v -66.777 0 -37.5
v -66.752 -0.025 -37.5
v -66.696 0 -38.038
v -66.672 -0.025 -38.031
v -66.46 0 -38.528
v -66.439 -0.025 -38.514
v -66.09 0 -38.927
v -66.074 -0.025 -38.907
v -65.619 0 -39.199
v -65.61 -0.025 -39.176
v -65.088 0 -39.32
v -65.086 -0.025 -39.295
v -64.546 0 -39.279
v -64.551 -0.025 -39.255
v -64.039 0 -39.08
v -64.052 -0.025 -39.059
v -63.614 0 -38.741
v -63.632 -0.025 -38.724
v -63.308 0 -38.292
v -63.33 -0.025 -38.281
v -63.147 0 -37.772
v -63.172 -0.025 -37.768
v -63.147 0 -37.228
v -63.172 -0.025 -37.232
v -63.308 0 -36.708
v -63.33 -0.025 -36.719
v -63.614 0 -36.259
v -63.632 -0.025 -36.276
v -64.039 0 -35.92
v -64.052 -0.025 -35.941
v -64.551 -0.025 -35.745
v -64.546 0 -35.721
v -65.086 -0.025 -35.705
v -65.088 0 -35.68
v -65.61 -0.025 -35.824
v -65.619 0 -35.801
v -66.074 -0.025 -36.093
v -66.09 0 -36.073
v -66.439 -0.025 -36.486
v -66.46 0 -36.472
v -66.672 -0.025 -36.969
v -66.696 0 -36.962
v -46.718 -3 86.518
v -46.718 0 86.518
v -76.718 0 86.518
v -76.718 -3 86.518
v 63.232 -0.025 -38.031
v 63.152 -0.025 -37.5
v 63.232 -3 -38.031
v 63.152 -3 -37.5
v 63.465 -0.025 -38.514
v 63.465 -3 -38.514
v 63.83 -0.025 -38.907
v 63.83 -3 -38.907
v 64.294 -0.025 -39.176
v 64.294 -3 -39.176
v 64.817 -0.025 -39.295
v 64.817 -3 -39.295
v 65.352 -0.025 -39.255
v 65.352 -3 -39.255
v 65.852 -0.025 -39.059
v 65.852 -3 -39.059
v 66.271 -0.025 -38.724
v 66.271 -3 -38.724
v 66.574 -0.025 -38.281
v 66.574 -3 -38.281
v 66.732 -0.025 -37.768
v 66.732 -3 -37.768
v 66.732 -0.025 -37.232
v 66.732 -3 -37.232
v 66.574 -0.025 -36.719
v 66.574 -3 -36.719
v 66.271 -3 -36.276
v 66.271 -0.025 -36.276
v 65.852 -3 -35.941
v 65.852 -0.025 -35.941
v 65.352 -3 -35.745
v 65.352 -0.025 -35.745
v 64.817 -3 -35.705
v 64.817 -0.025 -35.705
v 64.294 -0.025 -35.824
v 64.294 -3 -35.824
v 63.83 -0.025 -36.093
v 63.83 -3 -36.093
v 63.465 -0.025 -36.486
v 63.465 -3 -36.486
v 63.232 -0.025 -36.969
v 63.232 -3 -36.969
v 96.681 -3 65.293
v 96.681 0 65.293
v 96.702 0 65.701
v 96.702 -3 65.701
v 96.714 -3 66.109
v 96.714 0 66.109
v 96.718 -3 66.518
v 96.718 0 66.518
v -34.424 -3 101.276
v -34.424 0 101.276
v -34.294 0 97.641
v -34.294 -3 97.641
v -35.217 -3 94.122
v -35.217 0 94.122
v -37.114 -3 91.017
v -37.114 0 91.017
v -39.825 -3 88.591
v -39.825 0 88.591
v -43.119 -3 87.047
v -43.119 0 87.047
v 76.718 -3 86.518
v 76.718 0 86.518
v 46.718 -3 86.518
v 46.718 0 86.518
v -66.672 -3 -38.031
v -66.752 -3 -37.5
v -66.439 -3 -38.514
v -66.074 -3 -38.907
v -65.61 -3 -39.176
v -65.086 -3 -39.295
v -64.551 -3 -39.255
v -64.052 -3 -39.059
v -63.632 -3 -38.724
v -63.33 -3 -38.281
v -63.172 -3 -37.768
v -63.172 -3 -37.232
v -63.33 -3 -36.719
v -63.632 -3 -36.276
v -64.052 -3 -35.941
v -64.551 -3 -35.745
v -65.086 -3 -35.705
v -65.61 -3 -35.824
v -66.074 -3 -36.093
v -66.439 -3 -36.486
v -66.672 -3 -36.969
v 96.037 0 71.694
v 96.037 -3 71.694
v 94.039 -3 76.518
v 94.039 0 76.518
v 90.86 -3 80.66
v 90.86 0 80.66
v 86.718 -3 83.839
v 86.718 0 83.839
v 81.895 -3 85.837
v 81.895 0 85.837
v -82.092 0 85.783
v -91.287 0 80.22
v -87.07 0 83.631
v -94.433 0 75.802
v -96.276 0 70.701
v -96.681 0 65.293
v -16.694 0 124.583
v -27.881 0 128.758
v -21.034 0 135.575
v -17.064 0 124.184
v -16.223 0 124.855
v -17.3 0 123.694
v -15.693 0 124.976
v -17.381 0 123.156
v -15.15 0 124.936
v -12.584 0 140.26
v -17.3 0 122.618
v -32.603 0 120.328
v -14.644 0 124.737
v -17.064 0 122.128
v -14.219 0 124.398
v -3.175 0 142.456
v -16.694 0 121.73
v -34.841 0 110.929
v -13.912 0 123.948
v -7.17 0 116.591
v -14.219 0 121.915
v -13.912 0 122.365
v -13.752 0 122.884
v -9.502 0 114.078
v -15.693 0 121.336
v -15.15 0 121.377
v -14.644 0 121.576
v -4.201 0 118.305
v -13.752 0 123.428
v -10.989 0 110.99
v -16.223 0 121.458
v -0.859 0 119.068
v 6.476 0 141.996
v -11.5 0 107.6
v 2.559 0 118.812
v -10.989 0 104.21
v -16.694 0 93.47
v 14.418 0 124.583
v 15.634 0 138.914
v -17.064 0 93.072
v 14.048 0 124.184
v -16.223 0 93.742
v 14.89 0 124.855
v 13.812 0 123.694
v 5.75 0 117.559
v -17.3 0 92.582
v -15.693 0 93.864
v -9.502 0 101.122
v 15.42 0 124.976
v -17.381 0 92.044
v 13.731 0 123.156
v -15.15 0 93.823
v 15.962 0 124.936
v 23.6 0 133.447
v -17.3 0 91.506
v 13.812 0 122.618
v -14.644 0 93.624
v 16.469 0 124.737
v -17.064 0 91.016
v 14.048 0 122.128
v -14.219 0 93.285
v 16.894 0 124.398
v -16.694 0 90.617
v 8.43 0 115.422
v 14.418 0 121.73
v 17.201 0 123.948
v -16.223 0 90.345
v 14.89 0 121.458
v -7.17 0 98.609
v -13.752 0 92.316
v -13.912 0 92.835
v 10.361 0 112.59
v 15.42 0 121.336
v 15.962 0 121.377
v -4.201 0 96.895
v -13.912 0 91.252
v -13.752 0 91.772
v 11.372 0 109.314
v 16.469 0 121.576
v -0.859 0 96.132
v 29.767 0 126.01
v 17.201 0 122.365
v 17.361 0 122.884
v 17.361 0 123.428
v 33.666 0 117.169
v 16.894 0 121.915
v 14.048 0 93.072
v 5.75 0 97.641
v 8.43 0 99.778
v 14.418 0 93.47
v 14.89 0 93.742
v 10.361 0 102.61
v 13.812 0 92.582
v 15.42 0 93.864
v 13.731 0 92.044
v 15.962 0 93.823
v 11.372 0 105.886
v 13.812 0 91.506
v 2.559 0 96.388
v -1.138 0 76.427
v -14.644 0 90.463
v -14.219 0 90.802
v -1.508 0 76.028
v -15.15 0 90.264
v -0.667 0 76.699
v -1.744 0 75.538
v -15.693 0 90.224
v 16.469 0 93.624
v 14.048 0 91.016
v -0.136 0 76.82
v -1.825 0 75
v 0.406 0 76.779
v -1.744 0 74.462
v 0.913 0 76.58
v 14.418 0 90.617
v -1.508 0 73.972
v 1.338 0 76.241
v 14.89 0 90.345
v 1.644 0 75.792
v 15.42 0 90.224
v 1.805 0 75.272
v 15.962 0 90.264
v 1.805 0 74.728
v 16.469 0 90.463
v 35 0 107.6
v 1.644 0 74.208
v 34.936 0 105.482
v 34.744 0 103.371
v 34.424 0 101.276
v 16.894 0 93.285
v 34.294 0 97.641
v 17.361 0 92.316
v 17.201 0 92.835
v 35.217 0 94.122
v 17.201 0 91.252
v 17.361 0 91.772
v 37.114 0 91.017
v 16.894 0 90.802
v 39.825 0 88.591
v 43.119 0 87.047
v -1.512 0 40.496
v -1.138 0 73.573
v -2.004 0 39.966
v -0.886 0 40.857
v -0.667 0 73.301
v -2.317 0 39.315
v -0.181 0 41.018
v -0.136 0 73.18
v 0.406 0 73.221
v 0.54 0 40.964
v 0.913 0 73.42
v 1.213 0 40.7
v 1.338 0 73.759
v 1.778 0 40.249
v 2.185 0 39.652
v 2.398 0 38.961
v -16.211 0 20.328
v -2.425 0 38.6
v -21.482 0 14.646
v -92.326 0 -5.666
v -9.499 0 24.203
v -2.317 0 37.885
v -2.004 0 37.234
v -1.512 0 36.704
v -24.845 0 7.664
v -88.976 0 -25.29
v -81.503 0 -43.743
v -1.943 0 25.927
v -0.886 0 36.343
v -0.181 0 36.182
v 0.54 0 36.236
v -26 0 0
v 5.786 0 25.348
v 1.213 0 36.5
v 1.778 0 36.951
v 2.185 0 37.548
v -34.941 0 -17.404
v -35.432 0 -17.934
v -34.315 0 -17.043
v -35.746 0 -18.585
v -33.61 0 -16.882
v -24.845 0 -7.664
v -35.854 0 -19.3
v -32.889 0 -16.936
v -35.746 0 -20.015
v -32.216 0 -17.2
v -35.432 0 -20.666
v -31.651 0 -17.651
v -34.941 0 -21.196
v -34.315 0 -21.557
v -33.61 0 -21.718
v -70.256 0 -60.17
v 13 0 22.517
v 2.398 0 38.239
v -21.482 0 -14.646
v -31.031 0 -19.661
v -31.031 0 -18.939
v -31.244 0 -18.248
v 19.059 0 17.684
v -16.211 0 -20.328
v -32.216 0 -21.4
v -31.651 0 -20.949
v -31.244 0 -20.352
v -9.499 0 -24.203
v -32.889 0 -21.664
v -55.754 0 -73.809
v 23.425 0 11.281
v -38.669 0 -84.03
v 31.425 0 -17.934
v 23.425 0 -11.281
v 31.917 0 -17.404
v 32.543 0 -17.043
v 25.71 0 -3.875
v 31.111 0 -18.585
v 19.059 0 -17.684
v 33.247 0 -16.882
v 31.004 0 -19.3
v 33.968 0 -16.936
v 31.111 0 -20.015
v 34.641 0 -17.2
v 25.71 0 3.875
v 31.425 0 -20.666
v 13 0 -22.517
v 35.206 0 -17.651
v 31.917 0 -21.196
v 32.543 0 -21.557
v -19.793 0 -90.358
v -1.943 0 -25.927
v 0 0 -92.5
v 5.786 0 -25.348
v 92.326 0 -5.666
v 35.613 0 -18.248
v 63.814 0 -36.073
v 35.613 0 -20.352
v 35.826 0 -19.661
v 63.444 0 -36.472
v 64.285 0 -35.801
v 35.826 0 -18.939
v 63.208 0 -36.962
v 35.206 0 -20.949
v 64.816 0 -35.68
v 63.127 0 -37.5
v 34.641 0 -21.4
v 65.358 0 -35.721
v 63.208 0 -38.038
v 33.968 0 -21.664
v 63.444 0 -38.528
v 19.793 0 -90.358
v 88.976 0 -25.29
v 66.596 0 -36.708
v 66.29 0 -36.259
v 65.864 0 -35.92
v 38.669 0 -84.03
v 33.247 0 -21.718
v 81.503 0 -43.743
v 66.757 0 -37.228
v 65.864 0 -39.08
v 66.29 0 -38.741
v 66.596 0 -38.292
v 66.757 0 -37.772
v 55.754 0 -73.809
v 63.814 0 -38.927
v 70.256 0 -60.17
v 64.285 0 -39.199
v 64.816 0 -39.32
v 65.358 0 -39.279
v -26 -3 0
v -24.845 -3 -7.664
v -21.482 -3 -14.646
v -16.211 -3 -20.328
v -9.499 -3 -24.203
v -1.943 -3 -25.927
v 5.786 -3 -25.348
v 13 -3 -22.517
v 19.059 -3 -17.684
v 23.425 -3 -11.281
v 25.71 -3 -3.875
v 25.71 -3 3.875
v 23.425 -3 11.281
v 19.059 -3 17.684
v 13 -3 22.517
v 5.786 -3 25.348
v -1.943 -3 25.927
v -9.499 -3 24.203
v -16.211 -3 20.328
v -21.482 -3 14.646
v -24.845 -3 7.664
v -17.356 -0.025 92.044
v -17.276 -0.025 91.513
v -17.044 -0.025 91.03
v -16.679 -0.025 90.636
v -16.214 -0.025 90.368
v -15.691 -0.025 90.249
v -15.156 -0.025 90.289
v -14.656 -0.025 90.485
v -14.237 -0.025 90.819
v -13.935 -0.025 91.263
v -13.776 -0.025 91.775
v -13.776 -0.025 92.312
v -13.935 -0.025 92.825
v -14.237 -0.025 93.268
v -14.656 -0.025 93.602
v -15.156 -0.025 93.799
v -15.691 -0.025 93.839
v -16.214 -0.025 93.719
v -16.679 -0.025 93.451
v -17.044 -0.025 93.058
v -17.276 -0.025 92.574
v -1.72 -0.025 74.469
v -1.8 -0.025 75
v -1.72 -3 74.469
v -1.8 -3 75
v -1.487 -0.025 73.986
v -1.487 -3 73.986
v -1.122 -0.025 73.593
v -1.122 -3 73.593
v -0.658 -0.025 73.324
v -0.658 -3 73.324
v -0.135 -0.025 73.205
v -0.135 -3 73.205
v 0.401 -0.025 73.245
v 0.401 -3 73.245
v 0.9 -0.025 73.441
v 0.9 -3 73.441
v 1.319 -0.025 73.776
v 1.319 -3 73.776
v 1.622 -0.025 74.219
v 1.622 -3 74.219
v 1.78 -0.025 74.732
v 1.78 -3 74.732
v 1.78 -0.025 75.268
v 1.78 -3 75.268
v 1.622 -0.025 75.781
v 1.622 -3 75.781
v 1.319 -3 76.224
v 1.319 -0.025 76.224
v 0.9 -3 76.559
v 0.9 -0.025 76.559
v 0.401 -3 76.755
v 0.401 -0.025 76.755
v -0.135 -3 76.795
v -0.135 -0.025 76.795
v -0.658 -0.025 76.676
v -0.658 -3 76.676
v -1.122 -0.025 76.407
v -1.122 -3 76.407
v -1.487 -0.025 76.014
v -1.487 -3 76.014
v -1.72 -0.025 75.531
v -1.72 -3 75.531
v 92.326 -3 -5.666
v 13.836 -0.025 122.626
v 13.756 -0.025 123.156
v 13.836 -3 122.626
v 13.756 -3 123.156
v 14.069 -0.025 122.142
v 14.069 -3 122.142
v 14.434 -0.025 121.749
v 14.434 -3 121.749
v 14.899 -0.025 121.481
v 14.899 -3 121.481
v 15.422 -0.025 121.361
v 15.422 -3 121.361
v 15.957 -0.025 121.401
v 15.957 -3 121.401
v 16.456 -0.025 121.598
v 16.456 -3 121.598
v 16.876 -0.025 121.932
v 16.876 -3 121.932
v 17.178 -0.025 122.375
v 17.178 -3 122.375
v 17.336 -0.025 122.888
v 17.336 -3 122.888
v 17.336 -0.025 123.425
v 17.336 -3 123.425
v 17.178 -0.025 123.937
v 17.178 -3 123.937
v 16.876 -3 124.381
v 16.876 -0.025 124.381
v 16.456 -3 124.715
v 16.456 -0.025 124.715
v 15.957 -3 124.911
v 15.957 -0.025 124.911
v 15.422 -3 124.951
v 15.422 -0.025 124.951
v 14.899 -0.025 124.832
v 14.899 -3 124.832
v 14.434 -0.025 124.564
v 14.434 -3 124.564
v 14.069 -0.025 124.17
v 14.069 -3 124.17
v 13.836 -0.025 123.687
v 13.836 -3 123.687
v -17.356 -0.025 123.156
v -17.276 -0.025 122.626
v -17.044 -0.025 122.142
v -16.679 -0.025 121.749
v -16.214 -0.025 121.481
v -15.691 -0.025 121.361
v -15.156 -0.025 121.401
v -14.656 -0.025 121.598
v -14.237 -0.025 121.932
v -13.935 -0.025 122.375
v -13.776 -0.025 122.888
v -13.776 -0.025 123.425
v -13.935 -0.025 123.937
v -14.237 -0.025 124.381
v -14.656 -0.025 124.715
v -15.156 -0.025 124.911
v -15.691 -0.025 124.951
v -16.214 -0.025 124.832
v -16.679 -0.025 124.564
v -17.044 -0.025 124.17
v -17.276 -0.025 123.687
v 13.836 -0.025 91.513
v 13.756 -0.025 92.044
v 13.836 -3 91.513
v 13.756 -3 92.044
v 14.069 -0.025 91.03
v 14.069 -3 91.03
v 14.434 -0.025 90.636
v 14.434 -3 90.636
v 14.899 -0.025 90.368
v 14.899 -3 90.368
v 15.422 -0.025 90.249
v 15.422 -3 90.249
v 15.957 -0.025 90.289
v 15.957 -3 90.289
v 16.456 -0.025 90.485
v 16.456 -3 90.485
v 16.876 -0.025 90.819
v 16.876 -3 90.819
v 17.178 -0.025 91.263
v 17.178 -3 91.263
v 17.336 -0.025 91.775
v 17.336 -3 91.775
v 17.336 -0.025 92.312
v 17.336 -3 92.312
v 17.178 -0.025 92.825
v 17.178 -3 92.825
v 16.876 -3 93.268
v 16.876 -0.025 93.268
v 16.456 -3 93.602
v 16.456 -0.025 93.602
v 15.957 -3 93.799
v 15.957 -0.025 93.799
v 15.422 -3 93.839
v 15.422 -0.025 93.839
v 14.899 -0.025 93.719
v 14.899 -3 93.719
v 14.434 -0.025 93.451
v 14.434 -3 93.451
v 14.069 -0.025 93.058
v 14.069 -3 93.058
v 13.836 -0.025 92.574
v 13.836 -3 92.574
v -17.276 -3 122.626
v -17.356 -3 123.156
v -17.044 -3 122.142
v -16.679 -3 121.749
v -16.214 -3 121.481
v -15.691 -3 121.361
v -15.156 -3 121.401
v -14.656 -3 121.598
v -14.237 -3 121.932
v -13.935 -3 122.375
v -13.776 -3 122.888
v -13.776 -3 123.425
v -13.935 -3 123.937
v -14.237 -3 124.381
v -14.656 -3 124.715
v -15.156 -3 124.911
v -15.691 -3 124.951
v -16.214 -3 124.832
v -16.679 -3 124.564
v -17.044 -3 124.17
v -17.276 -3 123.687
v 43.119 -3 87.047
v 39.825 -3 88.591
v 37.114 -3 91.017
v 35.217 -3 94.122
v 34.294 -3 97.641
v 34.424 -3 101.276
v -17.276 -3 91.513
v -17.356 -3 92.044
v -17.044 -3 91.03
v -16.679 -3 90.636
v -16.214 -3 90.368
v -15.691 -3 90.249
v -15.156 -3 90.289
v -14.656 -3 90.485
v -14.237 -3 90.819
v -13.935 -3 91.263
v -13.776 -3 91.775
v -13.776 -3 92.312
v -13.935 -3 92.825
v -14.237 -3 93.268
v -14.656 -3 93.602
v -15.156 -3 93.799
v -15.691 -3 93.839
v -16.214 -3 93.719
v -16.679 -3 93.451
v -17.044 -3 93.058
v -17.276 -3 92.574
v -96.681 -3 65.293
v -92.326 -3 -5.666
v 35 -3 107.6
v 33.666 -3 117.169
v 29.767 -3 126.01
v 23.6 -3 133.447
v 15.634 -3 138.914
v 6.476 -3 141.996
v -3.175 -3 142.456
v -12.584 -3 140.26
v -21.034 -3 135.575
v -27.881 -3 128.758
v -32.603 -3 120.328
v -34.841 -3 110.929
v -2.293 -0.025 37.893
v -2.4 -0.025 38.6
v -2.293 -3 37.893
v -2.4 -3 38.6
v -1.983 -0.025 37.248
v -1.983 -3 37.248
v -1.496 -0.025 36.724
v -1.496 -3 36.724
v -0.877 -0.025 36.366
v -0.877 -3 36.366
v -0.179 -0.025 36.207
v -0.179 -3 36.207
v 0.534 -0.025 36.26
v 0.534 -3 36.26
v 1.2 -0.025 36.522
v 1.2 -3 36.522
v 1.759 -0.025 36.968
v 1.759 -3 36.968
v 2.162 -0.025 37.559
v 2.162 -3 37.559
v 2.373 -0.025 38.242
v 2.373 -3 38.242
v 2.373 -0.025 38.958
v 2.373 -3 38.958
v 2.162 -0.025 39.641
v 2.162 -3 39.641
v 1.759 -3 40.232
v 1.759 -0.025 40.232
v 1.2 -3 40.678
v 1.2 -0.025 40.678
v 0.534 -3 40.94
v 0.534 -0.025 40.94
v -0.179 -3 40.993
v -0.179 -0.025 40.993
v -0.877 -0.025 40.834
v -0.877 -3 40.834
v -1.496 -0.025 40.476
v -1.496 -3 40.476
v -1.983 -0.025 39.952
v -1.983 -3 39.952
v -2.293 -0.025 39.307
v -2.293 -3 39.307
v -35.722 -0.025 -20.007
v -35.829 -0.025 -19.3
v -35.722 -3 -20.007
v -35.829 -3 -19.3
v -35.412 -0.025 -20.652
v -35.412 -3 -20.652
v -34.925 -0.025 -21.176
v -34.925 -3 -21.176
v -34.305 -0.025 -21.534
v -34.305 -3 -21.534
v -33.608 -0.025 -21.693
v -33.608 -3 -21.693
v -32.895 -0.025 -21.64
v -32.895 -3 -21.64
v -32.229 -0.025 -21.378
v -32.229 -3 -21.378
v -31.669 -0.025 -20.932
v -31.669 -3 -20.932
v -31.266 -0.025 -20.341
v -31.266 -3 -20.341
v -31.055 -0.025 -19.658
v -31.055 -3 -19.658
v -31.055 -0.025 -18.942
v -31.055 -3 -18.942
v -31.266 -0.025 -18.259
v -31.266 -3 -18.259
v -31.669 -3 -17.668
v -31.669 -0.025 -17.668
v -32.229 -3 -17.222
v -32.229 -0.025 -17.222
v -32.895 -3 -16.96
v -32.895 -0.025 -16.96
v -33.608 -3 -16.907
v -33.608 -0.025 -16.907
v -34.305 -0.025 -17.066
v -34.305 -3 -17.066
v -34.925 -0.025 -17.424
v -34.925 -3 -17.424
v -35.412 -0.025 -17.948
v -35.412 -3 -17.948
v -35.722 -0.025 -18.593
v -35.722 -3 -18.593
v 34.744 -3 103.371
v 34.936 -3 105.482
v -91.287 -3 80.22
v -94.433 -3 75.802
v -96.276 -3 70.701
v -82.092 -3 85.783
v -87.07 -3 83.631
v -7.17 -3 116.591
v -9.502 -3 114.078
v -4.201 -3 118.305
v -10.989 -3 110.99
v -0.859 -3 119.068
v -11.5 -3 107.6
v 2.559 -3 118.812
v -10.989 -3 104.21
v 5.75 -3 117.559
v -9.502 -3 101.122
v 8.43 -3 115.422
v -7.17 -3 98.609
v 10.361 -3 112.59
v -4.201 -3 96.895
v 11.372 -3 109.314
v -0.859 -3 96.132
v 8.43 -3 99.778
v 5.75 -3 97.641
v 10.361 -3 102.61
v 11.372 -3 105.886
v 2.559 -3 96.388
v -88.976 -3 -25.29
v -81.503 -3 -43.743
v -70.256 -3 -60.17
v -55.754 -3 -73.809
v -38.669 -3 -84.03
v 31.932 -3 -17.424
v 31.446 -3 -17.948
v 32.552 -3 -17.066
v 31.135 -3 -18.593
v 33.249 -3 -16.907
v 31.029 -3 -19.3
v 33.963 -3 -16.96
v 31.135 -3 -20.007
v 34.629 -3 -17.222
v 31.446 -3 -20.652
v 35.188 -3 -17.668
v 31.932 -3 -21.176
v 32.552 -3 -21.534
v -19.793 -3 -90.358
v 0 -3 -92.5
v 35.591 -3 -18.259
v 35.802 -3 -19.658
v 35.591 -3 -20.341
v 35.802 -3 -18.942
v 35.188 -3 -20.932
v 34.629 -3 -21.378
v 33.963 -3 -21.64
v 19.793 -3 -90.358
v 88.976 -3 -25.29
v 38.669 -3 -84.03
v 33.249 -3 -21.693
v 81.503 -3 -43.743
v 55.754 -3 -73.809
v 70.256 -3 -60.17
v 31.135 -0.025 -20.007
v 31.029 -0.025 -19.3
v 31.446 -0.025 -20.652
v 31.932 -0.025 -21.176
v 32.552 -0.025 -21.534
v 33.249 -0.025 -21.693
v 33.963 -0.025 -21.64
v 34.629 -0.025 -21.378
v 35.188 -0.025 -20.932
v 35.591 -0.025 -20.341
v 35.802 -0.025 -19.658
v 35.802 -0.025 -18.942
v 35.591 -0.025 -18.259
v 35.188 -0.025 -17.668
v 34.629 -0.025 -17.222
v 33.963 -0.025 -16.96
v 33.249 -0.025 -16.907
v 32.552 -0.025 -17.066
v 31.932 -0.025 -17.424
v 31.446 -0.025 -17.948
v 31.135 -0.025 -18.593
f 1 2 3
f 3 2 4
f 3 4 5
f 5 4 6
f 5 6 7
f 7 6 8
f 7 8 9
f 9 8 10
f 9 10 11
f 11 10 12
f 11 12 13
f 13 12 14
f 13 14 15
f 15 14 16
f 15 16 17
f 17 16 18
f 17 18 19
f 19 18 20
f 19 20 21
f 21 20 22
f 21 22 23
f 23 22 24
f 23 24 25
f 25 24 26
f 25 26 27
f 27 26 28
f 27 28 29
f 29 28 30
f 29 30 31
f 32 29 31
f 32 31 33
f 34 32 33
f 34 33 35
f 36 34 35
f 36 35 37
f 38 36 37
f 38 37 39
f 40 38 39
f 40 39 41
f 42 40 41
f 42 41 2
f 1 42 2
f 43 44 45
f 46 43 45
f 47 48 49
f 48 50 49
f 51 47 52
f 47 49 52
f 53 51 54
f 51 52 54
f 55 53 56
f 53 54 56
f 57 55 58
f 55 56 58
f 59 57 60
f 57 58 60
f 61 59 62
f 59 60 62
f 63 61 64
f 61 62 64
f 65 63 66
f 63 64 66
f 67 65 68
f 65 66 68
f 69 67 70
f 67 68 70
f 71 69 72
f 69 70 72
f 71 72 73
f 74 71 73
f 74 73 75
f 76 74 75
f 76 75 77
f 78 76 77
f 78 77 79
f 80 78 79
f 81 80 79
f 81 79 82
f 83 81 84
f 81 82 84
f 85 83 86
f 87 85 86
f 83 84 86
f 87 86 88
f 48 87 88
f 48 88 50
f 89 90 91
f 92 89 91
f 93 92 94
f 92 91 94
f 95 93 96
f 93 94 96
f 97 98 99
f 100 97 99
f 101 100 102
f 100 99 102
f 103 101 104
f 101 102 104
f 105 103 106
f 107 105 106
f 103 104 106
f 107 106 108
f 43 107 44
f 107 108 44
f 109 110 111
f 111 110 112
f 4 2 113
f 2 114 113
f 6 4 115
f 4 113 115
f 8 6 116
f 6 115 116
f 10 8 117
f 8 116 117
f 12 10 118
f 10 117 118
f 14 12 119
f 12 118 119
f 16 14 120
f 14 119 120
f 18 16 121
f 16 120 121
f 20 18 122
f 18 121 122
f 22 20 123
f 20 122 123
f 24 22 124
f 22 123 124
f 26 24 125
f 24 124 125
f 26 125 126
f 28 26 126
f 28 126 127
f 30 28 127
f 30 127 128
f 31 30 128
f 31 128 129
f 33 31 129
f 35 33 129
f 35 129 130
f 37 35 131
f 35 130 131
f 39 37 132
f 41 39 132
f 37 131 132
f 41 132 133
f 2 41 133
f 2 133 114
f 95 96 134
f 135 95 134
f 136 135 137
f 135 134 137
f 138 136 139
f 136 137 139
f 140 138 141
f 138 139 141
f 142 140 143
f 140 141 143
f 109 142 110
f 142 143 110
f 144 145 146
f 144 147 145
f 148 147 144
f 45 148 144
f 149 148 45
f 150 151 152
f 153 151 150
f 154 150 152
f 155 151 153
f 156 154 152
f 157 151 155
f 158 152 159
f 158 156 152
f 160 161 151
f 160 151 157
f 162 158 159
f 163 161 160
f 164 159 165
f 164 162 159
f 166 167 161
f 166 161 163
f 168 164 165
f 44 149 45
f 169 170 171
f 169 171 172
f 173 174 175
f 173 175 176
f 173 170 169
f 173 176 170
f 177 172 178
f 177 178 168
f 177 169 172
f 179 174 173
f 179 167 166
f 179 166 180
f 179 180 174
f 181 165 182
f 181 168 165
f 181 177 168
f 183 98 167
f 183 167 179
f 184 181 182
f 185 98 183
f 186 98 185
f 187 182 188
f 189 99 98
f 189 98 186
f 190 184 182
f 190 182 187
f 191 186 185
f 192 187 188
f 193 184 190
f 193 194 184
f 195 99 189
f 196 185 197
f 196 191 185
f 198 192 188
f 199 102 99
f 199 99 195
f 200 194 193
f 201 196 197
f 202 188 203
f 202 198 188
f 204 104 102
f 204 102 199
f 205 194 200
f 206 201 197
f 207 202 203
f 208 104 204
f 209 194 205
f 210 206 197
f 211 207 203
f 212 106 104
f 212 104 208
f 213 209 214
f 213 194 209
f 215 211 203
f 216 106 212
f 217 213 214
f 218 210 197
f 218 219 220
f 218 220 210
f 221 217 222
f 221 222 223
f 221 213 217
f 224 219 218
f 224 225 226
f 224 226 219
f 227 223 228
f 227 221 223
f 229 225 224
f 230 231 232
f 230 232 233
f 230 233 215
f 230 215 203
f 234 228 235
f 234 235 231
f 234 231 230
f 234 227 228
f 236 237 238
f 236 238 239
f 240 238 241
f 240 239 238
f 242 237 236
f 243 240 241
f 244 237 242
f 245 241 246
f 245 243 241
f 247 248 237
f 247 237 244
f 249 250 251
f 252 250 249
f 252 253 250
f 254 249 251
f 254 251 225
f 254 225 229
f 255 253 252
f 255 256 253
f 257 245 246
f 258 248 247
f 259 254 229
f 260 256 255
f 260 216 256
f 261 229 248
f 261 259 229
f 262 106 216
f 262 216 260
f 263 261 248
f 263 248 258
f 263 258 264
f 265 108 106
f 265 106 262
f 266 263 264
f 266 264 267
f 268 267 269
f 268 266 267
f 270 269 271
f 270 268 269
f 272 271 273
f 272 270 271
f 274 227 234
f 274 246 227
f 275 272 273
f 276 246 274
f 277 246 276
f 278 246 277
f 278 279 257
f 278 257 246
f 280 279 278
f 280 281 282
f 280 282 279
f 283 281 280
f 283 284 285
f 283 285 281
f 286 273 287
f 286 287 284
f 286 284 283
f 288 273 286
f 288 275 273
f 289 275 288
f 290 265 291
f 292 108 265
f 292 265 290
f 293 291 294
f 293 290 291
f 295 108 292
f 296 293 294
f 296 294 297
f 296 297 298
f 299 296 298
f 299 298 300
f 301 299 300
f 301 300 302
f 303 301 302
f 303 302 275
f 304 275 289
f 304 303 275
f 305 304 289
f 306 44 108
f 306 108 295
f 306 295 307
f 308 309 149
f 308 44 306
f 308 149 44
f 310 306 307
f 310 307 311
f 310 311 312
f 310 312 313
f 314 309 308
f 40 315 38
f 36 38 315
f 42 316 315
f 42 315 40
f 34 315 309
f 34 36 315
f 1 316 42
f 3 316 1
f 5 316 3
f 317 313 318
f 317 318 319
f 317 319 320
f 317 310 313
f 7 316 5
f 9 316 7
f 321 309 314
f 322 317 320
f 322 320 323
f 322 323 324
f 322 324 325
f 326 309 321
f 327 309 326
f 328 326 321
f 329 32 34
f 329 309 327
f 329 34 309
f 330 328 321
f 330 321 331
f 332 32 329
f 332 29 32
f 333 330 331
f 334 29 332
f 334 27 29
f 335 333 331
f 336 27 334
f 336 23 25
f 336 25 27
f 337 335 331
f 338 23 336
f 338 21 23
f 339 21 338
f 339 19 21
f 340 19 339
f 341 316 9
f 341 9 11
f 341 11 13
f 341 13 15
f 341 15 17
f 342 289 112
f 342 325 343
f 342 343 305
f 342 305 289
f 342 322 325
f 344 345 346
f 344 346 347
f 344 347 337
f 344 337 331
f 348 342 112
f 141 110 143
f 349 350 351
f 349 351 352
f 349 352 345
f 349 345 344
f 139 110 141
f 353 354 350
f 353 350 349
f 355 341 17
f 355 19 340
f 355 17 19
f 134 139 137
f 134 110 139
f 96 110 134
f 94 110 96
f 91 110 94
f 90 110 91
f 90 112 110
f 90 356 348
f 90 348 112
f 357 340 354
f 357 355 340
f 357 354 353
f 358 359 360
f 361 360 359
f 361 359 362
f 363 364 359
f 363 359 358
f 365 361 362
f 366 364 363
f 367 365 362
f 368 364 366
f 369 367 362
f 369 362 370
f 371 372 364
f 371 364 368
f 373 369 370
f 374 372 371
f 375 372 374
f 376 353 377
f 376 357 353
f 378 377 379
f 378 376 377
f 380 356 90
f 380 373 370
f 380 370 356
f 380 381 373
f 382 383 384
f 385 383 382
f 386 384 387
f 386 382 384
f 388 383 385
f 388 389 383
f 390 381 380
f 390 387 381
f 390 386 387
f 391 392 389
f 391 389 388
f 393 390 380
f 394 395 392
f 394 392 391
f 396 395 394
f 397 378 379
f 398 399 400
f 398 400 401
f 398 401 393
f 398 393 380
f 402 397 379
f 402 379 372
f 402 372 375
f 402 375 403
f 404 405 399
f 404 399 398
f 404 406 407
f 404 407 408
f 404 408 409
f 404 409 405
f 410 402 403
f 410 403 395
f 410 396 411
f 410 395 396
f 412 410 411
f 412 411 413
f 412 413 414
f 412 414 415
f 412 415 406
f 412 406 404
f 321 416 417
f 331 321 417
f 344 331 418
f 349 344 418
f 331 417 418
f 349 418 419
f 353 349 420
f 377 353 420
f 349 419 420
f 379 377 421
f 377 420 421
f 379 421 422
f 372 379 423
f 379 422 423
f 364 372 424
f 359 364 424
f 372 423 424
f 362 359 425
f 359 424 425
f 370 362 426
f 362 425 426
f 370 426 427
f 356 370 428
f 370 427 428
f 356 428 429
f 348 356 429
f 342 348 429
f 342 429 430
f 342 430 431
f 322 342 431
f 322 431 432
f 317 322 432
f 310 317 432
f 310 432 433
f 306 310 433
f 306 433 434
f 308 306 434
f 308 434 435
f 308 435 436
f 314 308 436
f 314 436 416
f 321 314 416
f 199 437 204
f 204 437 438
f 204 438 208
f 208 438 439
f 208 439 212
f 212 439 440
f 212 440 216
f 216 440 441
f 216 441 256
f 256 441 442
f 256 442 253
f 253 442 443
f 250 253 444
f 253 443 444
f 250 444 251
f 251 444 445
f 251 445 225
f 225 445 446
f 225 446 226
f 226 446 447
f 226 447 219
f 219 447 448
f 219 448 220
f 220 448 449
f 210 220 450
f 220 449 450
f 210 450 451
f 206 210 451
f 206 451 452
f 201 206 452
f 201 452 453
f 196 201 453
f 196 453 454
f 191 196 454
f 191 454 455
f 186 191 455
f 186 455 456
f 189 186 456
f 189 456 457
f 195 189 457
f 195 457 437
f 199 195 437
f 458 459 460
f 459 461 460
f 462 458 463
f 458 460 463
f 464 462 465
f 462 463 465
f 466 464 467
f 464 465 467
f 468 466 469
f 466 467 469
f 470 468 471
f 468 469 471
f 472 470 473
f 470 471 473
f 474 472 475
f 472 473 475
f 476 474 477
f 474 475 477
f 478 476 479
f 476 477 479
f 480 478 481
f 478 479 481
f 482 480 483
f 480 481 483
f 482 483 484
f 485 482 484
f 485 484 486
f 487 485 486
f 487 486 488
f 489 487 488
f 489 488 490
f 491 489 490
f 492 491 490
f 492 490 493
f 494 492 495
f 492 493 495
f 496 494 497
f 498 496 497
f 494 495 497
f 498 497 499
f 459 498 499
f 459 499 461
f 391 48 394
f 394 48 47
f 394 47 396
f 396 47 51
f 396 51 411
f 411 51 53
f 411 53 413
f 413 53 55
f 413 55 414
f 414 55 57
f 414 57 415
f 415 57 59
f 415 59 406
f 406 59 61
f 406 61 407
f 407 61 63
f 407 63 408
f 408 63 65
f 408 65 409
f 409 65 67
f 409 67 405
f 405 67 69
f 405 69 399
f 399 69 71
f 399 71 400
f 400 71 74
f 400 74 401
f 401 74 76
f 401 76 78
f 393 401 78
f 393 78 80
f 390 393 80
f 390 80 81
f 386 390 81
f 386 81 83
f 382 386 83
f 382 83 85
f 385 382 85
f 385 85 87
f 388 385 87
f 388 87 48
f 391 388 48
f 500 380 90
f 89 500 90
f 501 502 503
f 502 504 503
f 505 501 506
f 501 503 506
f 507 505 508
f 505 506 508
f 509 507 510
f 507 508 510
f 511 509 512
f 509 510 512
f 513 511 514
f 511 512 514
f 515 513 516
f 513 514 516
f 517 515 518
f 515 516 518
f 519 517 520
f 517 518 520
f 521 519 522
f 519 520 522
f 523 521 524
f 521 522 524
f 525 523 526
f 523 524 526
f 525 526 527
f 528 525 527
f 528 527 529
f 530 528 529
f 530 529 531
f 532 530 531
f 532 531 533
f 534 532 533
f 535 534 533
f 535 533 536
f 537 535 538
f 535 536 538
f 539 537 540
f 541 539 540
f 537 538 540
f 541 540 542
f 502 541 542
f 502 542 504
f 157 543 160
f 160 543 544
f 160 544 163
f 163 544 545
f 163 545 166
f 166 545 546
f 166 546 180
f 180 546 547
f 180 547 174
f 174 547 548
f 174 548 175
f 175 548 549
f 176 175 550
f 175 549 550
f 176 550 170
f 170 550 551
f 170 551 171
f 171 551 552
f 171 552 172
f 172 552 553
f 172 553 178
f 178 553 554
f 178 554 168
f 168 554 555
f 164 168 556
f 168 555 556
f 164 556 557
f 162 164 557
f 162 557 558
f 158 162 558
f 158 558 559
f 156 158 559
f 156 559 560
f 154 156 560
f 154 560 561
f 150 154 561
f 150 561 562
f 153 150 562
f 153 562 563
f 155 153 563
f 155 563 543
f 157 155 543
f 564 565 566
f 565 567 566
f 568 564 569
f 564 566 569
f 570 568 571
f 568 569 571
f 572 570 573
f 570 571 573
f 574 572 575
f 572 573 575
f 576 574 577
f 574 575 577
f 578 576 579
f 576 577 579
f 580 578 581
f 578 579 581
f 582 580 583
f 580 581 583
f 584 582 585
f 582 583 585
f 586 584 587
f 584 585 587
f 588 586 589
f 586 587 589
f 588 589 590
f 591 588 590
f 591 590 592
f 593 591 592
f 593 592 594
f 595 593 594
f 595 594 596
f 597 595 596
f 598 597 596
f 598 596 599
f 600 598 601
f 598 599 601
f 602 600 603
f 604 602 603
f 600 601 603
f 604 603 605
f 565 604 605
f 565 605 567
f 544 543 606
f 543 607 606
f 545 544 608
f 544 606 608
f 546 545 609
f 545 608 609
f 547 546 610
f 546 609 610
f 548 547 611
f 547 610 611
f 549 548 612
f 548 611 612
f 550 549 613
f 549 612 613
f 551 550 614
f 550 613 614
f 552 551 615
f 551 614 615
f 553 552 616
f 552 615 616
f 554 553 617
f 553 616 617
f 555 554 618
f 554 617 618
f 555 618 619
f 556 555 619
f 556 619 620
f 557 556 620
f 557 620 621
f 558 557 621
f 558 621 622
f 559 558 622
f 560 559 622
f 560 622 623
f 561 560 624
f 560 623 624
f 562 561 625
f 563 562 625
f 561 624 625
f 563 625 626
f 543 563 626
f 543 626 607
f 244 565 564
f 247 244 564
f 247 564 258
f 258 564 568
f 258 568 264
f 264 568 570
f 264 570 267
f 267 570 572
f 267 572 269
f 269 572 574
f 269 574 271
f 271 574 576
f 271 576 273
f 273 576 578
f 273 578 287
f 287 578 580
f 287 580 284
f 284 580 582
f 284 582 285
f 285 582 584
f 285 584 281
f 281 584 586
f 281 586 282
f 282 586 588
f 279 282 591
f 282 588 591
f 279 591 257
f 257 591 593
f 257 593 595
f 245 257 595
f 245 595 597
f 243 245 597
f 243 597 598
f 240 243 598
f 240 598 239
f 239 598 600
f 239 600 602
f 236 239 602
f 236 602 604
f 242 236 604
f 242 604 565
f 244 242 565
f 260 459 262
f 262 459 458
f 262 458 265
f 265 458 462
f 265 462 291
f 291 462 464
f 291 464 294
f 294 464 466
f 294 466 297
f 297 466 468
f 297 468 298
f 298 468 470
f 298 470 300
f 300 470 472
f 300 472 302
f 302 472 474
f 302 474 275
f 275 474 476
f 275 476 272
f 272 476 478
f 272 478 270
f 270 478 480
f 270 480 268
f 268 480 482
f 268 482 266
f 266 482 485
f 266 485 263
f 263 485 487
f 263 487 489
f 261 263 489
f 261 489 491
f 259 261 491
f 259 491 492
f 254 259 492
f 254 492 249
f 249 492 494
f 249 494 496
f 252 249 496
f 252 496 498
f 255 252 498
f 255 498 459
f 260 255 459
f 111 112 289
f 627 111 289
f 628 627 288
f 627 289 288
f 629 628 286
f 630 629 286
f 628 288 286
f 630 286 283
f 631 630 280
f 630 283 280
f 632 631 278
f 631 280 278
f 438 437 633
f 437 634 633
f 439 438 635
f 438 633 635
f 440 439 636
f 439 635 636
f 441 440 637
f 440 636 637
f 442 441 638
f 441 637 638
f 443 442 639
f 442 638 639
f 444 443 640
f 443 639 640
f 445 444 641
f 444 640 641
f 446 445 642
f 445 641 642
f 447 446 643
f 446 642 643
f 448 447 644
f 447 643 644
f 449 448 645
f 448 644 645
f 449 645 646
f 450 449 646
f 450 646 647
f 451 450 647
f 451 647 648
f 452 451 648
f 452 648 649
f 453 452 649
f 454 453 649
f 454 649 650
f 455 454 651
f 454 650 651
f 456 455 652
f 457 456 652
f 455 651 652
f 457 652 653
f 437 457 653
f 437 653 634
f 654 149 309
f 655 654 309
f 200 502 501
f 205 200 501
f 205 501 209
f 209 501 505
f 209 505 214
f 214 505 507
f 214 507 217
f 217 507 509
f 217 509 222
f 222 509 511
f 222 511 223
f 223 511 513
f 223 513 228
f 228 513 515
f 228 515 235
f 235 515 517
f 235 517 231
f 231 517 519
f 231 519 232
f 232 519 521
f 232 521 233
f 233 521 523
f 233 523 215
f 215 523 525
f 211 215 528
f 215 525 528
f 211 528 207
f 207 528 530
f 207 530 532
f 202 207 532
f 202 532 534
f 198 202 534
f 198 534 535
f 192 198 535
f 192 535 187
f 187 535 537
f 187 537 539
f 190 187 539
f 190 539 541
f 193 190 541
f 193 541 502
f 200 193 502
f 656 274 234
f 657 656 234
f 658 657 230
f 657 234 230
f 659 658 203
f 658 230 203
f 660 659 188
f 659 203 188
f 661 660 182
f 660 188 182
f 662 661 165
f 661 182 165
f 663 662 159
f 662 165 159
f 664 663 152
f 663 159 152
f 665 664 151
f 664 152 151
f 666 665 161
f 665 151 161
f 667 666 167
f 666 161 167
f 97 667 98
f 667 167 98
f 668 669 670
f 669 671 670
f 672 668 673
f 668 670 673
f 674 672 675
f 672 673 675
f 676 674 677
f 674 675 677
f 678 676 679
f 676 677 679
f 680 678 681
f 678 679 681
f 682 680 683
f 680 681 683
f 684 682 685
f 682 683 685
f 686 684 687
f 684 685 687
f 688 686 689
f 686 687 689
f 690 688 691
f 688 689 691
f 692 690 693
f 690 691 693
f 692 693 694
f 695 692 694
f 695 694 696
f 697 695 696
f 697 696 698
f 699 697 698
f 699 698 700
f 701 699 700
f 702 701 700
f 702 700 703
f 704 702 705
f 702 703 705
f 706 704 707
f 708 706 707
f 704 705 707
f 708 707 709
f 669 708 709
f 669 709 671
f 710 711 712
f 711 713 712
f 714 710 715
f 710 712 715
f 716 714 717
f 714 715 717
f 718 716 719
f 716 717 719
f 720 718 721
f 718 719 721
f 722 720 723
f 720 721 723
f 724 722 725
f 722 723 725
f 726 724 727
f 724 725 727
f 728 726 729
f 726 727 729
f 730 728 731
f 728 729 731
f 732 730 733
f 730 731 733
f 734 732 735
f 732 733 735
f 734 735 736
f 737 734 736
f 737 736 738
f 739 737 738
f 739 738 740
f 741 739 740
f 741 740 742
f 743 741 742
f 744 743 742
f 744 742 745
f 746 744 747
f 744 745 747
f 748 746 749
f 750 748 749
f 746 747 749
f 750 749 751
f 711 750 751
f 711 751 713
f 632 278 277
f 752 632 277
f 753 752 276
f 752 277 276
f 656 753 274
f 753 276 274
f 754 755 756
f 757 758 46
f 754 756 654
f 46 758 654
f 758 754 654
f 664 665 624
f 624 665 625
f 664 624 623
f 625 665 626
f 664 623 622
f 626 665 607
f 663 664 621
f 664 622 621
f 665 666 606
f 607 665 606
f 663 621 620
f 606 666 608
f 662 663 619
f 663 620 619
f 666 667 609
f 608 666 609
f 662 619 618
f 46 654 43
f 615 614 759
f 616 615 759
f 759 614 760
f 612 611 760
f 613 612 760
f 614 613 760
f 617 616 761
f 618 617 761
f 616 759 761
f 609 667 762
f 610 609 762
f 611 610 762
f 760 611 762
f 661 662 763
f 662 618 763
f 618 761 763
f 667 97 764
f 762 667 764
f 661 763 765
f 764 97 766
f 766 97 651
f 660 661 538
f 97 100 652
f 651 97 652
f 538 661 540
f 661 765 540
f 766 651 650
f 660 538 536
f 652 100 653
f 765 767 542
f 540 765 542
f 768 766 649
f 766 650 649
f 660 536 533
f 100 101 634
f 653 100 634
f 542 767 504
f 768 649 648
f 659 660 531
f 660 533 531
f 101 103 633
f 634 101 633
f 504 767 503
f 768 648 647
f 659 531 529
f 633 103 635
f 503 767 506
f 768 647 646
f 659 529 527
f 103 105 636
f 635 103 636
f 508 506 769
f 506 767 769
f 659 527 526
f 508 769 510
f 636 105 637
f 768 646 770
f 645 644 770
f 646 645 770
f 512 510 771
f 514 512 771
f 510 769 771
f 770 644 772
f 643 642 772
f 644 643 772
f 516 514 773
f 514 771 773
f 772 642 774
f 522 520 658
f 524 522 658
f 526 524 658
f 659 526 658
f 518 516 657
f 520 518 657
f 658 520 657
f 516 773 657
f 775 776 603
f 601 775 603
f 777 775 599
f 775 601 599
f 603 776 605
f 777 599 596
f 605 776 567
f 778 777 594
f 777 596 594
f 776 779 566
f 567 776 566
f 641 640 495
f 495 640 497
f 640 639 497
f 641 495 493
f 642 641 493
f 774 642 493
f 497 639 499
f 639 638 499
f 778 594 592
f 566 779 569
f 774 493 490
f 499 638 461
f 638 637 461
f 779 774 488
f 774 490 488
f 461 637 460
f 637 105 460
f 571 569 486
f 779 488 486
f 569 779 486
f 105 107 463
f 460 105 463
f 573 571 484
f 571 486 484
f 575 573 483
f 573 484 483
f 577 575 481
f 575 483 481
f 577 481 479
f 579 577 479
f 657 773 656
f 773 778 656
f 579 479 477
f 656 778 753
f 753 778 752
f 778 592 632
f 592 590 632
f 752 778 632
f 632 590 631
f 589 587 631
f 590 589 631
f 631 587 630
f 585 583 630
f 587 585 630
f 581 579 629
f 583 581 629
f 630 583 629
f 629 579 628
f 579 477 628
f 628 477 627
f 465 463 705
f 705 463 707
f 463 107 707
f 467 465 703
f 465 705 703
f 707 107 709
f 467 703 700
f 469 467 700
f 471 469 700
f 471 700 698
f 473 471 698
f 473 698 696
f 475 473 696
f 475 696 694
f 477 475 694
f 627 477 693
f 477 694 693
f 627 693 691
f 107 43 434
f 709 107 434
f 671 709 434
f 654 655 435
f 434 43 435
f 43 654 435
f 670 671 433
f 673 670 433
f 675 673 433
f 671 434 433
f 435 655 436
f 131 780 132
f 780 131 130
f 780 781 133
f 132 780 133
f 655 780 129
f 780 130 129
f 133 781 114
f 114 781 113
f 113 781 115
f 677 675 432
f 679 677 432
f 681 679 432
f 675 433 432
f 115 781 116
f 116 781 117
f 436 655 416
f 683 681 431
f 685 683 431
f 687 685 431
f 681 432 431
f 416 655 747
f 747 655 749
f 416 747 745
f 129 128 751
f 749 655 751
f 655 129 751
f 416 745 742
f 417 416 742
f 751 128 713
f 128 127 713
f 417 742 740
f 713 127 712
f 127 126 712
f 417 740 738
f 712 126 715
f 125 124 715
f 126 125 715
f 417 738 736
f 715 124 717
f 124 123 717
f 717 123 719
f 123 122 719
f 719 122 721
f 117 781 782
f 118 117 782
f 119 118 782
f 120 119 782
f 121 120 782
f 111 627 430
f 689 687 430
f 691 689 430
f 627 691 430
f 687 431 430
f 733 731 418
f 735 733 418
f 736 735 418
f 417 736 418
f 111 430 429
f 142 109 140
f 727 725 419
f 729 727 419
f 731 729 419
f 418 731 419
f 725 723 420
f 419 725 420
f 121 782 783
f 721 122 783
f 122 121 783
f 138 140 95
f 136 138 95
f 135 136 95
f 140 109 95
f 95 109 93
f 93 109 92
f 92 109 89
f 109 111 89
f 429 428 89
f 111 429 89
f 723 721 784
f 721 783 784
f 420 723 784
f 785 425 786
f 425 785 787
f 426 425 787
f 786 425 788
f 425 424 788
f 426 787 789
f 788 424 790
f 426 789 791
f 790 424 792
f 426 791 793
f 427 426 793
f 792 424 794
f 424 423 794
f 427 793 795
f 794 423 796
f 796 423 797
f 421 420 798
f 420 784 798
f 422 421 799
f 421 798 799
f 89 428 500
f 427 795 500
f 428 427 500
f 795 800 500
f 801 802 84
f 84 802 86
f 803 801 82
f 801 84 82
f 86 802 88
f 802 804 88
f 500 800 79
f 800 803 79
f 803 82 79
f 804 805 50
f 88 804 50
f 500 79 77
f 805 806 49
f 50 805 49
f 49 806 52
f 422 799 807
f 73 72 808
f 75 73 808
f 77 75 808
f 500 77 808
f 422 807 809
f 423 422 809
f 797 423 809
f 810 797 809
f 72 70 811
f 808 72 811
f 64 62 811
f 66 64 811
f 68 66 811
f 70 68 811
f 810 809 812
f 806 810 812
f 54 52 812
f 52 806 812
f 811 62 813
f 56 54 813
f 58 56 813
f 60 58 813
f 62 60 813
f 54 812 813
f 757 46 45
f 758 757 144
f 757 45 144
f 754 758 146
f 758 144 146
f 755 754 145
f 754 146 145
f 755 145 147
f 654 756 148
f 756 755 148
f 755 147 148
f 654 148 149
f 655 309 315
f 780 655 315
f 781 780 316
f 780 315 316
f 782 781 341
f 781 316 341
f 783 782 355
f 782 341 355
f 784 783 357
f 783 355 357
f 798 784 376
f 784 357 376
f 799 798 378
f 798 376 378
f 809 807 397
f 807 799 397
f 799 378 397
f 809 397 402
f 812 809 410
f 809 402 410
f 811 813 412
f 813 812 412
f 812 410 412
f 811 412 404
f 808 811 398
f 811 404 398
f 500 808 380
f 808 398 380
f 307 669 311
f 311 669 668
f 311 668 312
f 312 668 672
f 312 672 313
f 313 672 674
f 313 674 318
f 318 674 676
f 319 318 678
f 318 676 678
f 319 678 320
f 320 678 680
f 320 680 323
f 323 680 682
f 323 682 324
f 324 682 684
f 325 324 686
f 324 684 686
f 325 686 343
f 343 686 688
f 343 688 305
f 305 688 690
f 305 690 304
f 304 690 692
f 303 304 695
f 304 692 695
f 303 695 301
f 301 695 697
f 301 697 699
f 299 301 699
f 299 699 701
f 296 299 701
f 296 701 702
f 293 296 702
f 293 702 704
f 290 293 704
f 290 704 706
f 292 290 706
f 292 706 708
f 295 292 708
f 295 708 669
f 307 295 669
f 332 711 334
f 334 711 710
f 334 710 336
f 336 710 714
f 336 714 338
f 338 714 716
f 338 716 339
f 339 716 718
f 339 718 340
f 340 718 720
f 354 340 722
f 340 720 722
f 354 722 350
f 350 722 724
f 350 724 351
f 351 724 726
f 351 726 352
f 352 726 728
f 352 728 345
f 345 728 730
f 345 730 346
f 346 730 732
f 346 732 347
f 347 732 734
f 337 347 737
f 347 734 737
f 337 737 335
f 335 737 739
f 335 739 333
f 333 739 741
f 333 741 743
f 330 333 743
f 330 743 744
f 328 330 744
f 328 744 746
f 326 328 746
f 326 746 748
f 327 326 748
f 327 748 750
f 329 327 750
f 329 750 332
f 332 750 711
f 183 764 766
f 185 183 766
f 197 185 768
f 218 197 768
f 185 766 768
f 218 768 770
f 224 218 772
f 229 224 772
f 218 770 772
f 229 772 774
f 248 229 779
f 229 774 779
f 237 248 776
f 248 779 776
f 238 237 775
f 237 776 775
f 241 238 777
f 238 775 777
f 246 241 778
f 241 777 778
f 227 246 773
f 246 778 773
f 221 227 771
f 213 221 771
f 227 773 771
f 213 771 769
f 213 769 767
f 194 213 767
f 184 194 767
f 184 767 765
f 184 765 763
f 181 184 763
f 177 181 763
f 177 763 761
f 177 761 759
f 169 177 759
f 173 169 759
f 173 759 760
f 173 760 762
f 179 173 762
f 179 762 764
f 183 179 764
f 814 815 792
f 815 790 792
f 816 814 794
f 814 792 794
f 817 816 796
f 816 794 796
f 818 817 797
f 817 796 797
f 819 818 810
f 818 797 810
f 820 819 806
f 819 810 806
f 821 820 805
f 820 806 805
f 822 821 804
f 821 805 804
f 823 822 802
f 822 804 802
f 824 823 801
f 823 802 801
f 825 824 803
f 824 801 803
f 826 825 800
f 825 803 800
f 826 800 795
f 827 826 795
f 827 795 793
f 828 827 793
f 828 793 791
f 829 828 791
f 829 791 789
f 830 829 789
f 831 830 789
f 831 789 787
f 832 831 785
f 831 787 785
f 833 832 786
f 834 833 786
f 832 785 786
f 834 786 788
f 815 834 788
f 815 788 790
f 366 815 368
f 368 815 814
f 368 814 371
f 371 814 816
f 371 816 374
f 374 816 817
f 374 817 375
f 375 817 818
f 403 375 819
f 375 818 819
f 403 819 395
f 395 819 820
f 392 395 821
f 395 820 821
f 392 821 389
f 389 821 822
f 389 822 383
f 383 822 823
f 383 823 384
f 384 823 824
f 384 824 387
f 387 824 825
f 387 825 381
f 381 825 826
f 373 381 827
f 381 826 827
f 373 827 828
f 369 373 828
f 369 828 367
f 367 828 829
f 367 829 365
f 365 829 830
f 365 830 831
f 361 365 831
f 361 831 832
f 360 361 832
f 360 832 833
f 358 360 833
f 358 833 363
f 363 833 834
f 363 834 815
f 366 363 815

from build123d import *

# Parameters (mm, degrees)
SKETCH1_W                      = 400
SKETCH1_H                      = 400
BOSS_EXTRUDE1_DEPTH            = 3
HOLE1_D                        = 52
HOLE1_DEPTH                    = 10
HOLE2_D                        = 23
HOLE2_DEPTH                    = 100
M4_CLEARANCE_HOLE1_D           = 4.8
M4_CLEARANCE_HOLE1_CSINK_D     = 4.85
M4_CLEARANCE_HOLE1_CSINK_ANGLE = 90
M3_CLEARANCE_HOLE1_D           = 3.6
M3_CLEARANCE_HOLE1_CSINK_D     = 3.65
M3_CLEARANCE_HOLE1_CSINK_ANGLE = 90
SKETCH11_W                     = 667.246369456
SKETCH11_H                     = 555.388303621
CUT_EXTRUDE1_DEPTH             = 1
CUT_EXTRUDE1_DEPTH_BACK        = 4
M3_CLEARANCE_HOLE2_D           = 3.6
M3_CLEARANCE_HOLE2_CSINK_D     = 3.65
M3_CLEARANCE_HOLE2_CSINK_ANGLE = 90


with BuildPart() as part:
    # Sketch1 → Boss-Extrude1 (new body)
    with BuildSketch(Plane(origin=(0, 0, 0), x_dir=(1, 0, 0), z_dir=(0, 1, 0))):
        with Locations((0, -52.110233191)):
            Rectangle(SKETCH1_W, SKETCH1_H)
    extrude(amount=-BOSS_EXTRUDE1_DEPTH)

    # Hole1
    with Locations(Plane(origin=(0, 0, 0), x_dir=(1, 0, 0), z_dir=(0, 1, 0))):
        with Locations((0, 0)):
            Hole(HOLE1_D / 2, depth=HOLE1_DEPTH)

    # Hole2
    with Locations(Plane(origin=(0, 0, 0), x_dir=(1, 0, 0), z_dir=(0, 1, 0))):
        with Locations((0, -107.6)):
            Hole(HOLE2_D / 2, depth=HOLE2_DEPTH)

    # M4 Clearance Hole1 (through all)
    with Locations(Plane(origin=(0, 0, 0), x_dir=(1, 0, 0), z_dir=(0, 1, 0))):
        with Locations((0, -38.6), (33.428580586, 19.3), (-33.428580586, 19.3)):
            CounterSinkHole(M4_CLEARANCE_HOLE1_D / 2, M4_CLEARANCE_HOLE1_CSINK_D / 2, counter_sink_angle=M4_CLEARANCE_HOLE1_CSINK_ANGLE)

    # M3 Clearance Hole1 (through all)
    with Locations(Plane(origin=(0, 0, 0), x_dir=(1, 0, 0), z_dir=(0, 1, 0))):
        with Locations((15.556349186, -92.043650814), (-15.556349186, -92.043650814), (-15.556349186, -123.156349186), (15.556349186, -123.156349186)):
            CounterSinkHole(M3_CLEARANCE_HOLE1_D / 2, M3_CLEARANCE_HOLE1_CSINK_D / 2, counter_sink_angle=M3_CLEARANCE_HOLE1_CSINK_ANGLE)

    # Sketch11 → Cut-Extrude1 (cut, two sides)
    with BuildSketch(Plane(origin=(0, 0, 0), x_dir=(1, 0, 0), z_dir=(0, 1, 0))) as cut_extrude1_sk:
        with Locations((-28.870236031, -19.694924611)):
            Rectangle(SKETCH11_W, SKETCH11_H)
        with BuildLine():
            Line((-46.718297015, -86.518), (-76.718297015, -86.518))
            ThreePointArc((-76.718297015, -86.518), (-91.287101954, -80.220186783), (-96.680745664, -65.292992264))
            Line((-96.680745664, -65.292992264), (-92.326325, 5.665660778))
            ThreePointArc((-92.326325, 5.665660778), (0, 92.5), (92.326325, 5.665660778))
            Line((92.326325, 5.665660778), (96.680745664, -65.292992264))
            ThreePointArc((96.680745664, -65.292992264), (96.708906973, -65.905208425), (96.718297015, -66.518))
            ThreePointArc((96.718297015, -66.518), (90.860432639, -80.660135624), (76.718297015, -86.518))
            Line((76.718297015, -86.518), (46.718297015, -86.518))
            ThreePointArc((46.718297015, -86.518), (37.114124402, -91.017383247), (34.424008327, -101.276421053))
            ThreePointArc((34.424008327, -101.276421053), (34.855704637, -104.425121376), (35, -107.6))
            ThreePointArc((35, -107.6), (-3.174878624, -142.455704637), (-34.424008327, -101.276421053))
            ThreePointArc((-34.424008327, -101.276421053), (-37.114124402, -91.017383247), (-46.718297015, -86.518))
        make_face(mode=Mode.SUBTRACT)
    extrude(amount=CUT_EXTRUDE1_DEPTH, mode=Mode.SUBTRACT)
    extrude(cut_extrude1_sk.sketch, amount=-CUT_EXTRUDE1_DEPTH_BACK, mode=Mode.SUBTRACT)

    # M3 Clearance Hole2 (through all)
    with Locations(Plane(origin=(0, 0, 0), x_dir=(1, 0, 0), z_dir=(0, 1, 0))):
        with Locations((-64.951905284, 37.5), (0, -75), (64.951905284, 37.5)):
            CounterSinkHole(M3_CLEARANCE_HOLE2_D / 2, M3_CLEARANCE_HOLE2_CSINK_D / 2, counter_sink_angle=M3_CLEARANCE_HOLE2_CSINK_ANGLE)


solid = part.part
